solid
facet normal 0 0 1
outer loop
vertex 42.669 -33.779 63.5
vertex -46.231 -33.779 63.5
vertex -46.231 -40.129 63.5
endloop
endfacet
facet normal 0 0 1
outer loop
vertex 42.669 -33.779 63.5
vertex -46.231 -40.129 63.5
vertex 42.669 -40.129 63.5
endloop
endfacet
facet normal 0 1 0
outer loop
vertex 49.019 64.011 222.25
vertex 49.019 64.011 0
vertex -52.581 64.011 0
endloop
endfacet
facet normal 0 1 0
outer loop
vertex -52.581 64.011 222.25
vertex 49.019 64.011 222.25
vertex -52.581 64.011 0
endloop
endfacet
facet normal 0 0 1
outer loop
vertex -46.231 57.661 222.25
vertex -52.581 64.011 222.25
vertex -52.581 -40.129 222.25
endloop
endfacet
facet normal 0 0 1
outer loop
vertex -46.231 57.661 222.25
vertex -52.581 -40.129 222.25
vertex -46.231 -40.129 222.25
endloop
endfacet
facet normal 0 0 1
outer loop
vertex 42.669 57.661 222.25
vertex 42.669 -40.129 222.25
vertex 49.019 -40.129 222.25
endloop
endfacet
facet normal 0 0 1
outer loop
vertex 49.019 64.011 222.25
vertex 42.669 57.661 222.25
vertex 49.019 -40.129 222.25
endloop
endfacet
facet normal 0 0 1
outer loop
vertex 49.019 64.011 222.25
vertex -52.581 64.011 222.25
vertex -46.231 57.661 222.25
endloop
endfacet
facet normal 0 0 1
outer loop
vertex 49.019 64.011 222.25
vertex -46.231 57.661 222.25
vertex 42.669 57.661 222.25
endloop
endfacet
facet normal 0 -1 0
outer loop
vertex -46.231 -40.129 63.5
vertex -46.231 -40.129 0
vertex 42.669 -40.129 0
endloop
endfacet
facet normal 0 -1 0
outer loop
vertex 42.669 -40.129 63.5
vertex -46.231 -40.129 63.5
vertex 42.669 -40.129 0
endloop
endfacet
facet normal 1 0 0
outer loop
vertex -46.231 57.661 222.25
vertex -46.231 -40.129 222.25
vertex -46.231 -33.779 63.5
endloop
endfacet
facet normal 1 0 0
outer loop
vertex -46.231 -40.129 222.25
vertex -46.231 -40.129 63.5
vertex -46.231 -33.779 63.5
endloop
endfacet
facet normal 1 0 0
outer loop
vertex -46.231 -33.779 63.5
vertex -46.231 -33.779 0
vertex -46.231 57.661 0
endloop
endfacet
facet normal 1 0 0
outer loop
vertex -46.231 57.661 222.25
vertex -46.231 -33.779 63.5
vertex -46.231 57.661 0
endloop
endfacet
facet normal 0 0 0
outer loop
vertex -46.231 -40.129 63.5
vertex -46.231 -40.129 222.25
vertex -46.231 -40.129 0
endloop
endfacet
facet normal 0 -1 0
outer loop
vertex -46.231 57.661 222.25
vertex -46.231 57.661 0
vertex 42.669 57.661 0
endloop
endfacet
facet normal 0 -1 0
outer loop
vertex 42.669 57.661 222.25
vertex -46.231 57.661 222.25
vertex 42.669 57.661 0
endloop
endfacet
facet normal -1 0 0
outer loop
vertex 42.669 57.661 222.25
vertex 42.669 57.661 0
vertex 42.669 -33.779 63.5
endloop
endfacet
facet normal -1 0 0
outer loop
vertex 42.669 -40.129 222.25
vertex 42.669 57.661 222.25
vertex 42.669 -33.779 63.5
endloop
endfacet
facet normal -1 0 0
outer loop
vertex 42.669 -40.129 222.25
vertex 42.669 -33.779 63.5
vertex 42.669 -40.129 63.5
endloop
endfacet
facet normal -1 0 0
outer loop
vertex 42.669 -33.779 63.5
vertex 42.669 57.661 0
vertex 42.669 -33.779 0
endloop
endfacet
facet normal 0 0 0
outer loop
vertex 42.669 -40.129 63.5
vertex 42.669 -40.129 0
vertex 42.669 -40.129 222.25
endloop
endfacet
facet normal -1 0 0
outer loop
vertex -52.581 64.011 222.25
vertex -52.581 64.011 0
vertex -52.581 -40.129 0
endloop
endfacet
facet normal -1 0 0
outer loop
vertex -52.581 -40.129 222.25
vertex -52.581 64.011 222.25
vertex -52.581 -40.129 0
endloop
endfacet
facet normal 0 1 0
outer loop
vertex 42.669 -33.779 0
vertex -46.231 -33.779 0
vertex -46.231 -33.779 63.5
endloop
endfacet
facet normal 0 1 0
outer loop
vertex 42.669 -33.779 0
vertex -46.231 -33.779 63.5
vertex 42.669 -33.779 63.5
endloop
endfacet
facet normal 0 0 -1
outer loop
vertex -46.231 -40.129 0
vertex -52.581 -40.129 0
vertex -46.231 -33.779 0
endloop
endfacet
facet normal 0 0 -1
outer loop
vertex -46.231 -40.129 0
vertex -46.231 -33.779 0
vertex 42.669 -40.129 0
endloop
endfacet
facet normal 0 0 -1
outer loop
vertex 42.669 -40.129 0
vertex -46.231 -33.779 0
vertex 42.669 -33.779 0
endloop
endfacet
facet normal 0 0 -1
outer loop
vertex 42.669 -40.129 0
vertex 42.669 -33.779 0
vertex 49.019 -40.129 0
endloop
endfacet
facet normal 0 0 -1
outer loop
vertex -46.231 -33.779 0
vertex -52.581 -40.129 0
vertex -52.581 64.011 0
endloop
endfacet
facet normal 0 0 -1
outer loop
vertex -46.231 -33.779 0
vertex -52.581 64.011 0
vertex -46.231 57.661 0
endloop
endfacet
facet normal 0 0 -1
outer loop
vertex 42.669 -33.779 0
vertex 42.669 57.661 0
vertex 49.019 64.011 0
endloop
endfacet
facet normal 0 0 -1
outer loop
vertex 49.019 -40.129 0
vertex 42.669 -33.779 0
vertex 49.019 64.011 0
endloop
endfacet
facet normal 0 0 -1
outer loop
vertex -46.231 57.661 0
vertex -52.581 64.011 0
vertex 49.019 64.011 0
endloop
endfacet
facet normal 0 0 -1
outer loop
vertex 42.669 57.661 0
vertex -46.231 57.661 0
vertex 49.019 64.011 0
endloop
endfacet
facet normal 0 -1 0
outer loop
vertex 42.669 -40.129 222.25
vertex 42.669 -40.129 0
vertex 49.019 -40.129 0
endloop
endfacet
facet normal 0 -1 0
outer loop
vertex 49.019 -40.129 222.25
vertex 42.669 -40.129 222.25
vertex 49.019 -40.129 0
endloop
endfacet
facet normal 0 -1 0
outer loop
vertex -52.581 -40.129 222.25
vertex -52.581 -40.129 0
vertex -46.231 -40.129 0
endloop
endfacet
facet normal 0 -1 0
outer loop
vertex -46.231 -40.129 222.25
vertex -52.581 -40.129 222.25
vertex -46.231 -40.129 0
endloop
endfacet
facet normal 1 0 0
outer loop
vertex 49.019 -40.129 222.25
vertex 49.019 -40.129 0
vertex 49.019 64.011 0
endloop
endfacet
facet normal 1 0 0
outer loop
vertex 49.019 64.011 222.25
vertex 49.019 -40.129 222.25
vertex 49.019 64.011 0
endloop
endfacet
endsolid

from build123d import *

# Parameters (mm, degrees)
F0_W     = 88.9
F0_H     = 6.350001
F1_DEPTH = 63.5
F2_DEPTH = 222.25


with BuildPart() as f1:
    # F0 (on Top) → F1 (new body)
    with BuildSketch(Plane.XY):
        with Locations((-1.781045, -36.954149)):
            Rectangle(F0_W, F0_H)
    extrude(amount=F1_DEPTH)

    # F0 (on Top) → F2 (join)
    with BuildSketch(Plane.XY):
        Polygon((-46.231045, -33.779149), (-46.231045, 57.660851), (42.668955, 57.660851), (42.668955, -33.779149), (42.668955, -40.12915), (49.018957, -40.12915), (49.018957, 64.010852), (-52.581046, 64.010852), (-52.581046, -40.12915), (-46.231045, -40.12915), align=None)
    extrude(amount=F2_DEPTH)


solid = f1.part
